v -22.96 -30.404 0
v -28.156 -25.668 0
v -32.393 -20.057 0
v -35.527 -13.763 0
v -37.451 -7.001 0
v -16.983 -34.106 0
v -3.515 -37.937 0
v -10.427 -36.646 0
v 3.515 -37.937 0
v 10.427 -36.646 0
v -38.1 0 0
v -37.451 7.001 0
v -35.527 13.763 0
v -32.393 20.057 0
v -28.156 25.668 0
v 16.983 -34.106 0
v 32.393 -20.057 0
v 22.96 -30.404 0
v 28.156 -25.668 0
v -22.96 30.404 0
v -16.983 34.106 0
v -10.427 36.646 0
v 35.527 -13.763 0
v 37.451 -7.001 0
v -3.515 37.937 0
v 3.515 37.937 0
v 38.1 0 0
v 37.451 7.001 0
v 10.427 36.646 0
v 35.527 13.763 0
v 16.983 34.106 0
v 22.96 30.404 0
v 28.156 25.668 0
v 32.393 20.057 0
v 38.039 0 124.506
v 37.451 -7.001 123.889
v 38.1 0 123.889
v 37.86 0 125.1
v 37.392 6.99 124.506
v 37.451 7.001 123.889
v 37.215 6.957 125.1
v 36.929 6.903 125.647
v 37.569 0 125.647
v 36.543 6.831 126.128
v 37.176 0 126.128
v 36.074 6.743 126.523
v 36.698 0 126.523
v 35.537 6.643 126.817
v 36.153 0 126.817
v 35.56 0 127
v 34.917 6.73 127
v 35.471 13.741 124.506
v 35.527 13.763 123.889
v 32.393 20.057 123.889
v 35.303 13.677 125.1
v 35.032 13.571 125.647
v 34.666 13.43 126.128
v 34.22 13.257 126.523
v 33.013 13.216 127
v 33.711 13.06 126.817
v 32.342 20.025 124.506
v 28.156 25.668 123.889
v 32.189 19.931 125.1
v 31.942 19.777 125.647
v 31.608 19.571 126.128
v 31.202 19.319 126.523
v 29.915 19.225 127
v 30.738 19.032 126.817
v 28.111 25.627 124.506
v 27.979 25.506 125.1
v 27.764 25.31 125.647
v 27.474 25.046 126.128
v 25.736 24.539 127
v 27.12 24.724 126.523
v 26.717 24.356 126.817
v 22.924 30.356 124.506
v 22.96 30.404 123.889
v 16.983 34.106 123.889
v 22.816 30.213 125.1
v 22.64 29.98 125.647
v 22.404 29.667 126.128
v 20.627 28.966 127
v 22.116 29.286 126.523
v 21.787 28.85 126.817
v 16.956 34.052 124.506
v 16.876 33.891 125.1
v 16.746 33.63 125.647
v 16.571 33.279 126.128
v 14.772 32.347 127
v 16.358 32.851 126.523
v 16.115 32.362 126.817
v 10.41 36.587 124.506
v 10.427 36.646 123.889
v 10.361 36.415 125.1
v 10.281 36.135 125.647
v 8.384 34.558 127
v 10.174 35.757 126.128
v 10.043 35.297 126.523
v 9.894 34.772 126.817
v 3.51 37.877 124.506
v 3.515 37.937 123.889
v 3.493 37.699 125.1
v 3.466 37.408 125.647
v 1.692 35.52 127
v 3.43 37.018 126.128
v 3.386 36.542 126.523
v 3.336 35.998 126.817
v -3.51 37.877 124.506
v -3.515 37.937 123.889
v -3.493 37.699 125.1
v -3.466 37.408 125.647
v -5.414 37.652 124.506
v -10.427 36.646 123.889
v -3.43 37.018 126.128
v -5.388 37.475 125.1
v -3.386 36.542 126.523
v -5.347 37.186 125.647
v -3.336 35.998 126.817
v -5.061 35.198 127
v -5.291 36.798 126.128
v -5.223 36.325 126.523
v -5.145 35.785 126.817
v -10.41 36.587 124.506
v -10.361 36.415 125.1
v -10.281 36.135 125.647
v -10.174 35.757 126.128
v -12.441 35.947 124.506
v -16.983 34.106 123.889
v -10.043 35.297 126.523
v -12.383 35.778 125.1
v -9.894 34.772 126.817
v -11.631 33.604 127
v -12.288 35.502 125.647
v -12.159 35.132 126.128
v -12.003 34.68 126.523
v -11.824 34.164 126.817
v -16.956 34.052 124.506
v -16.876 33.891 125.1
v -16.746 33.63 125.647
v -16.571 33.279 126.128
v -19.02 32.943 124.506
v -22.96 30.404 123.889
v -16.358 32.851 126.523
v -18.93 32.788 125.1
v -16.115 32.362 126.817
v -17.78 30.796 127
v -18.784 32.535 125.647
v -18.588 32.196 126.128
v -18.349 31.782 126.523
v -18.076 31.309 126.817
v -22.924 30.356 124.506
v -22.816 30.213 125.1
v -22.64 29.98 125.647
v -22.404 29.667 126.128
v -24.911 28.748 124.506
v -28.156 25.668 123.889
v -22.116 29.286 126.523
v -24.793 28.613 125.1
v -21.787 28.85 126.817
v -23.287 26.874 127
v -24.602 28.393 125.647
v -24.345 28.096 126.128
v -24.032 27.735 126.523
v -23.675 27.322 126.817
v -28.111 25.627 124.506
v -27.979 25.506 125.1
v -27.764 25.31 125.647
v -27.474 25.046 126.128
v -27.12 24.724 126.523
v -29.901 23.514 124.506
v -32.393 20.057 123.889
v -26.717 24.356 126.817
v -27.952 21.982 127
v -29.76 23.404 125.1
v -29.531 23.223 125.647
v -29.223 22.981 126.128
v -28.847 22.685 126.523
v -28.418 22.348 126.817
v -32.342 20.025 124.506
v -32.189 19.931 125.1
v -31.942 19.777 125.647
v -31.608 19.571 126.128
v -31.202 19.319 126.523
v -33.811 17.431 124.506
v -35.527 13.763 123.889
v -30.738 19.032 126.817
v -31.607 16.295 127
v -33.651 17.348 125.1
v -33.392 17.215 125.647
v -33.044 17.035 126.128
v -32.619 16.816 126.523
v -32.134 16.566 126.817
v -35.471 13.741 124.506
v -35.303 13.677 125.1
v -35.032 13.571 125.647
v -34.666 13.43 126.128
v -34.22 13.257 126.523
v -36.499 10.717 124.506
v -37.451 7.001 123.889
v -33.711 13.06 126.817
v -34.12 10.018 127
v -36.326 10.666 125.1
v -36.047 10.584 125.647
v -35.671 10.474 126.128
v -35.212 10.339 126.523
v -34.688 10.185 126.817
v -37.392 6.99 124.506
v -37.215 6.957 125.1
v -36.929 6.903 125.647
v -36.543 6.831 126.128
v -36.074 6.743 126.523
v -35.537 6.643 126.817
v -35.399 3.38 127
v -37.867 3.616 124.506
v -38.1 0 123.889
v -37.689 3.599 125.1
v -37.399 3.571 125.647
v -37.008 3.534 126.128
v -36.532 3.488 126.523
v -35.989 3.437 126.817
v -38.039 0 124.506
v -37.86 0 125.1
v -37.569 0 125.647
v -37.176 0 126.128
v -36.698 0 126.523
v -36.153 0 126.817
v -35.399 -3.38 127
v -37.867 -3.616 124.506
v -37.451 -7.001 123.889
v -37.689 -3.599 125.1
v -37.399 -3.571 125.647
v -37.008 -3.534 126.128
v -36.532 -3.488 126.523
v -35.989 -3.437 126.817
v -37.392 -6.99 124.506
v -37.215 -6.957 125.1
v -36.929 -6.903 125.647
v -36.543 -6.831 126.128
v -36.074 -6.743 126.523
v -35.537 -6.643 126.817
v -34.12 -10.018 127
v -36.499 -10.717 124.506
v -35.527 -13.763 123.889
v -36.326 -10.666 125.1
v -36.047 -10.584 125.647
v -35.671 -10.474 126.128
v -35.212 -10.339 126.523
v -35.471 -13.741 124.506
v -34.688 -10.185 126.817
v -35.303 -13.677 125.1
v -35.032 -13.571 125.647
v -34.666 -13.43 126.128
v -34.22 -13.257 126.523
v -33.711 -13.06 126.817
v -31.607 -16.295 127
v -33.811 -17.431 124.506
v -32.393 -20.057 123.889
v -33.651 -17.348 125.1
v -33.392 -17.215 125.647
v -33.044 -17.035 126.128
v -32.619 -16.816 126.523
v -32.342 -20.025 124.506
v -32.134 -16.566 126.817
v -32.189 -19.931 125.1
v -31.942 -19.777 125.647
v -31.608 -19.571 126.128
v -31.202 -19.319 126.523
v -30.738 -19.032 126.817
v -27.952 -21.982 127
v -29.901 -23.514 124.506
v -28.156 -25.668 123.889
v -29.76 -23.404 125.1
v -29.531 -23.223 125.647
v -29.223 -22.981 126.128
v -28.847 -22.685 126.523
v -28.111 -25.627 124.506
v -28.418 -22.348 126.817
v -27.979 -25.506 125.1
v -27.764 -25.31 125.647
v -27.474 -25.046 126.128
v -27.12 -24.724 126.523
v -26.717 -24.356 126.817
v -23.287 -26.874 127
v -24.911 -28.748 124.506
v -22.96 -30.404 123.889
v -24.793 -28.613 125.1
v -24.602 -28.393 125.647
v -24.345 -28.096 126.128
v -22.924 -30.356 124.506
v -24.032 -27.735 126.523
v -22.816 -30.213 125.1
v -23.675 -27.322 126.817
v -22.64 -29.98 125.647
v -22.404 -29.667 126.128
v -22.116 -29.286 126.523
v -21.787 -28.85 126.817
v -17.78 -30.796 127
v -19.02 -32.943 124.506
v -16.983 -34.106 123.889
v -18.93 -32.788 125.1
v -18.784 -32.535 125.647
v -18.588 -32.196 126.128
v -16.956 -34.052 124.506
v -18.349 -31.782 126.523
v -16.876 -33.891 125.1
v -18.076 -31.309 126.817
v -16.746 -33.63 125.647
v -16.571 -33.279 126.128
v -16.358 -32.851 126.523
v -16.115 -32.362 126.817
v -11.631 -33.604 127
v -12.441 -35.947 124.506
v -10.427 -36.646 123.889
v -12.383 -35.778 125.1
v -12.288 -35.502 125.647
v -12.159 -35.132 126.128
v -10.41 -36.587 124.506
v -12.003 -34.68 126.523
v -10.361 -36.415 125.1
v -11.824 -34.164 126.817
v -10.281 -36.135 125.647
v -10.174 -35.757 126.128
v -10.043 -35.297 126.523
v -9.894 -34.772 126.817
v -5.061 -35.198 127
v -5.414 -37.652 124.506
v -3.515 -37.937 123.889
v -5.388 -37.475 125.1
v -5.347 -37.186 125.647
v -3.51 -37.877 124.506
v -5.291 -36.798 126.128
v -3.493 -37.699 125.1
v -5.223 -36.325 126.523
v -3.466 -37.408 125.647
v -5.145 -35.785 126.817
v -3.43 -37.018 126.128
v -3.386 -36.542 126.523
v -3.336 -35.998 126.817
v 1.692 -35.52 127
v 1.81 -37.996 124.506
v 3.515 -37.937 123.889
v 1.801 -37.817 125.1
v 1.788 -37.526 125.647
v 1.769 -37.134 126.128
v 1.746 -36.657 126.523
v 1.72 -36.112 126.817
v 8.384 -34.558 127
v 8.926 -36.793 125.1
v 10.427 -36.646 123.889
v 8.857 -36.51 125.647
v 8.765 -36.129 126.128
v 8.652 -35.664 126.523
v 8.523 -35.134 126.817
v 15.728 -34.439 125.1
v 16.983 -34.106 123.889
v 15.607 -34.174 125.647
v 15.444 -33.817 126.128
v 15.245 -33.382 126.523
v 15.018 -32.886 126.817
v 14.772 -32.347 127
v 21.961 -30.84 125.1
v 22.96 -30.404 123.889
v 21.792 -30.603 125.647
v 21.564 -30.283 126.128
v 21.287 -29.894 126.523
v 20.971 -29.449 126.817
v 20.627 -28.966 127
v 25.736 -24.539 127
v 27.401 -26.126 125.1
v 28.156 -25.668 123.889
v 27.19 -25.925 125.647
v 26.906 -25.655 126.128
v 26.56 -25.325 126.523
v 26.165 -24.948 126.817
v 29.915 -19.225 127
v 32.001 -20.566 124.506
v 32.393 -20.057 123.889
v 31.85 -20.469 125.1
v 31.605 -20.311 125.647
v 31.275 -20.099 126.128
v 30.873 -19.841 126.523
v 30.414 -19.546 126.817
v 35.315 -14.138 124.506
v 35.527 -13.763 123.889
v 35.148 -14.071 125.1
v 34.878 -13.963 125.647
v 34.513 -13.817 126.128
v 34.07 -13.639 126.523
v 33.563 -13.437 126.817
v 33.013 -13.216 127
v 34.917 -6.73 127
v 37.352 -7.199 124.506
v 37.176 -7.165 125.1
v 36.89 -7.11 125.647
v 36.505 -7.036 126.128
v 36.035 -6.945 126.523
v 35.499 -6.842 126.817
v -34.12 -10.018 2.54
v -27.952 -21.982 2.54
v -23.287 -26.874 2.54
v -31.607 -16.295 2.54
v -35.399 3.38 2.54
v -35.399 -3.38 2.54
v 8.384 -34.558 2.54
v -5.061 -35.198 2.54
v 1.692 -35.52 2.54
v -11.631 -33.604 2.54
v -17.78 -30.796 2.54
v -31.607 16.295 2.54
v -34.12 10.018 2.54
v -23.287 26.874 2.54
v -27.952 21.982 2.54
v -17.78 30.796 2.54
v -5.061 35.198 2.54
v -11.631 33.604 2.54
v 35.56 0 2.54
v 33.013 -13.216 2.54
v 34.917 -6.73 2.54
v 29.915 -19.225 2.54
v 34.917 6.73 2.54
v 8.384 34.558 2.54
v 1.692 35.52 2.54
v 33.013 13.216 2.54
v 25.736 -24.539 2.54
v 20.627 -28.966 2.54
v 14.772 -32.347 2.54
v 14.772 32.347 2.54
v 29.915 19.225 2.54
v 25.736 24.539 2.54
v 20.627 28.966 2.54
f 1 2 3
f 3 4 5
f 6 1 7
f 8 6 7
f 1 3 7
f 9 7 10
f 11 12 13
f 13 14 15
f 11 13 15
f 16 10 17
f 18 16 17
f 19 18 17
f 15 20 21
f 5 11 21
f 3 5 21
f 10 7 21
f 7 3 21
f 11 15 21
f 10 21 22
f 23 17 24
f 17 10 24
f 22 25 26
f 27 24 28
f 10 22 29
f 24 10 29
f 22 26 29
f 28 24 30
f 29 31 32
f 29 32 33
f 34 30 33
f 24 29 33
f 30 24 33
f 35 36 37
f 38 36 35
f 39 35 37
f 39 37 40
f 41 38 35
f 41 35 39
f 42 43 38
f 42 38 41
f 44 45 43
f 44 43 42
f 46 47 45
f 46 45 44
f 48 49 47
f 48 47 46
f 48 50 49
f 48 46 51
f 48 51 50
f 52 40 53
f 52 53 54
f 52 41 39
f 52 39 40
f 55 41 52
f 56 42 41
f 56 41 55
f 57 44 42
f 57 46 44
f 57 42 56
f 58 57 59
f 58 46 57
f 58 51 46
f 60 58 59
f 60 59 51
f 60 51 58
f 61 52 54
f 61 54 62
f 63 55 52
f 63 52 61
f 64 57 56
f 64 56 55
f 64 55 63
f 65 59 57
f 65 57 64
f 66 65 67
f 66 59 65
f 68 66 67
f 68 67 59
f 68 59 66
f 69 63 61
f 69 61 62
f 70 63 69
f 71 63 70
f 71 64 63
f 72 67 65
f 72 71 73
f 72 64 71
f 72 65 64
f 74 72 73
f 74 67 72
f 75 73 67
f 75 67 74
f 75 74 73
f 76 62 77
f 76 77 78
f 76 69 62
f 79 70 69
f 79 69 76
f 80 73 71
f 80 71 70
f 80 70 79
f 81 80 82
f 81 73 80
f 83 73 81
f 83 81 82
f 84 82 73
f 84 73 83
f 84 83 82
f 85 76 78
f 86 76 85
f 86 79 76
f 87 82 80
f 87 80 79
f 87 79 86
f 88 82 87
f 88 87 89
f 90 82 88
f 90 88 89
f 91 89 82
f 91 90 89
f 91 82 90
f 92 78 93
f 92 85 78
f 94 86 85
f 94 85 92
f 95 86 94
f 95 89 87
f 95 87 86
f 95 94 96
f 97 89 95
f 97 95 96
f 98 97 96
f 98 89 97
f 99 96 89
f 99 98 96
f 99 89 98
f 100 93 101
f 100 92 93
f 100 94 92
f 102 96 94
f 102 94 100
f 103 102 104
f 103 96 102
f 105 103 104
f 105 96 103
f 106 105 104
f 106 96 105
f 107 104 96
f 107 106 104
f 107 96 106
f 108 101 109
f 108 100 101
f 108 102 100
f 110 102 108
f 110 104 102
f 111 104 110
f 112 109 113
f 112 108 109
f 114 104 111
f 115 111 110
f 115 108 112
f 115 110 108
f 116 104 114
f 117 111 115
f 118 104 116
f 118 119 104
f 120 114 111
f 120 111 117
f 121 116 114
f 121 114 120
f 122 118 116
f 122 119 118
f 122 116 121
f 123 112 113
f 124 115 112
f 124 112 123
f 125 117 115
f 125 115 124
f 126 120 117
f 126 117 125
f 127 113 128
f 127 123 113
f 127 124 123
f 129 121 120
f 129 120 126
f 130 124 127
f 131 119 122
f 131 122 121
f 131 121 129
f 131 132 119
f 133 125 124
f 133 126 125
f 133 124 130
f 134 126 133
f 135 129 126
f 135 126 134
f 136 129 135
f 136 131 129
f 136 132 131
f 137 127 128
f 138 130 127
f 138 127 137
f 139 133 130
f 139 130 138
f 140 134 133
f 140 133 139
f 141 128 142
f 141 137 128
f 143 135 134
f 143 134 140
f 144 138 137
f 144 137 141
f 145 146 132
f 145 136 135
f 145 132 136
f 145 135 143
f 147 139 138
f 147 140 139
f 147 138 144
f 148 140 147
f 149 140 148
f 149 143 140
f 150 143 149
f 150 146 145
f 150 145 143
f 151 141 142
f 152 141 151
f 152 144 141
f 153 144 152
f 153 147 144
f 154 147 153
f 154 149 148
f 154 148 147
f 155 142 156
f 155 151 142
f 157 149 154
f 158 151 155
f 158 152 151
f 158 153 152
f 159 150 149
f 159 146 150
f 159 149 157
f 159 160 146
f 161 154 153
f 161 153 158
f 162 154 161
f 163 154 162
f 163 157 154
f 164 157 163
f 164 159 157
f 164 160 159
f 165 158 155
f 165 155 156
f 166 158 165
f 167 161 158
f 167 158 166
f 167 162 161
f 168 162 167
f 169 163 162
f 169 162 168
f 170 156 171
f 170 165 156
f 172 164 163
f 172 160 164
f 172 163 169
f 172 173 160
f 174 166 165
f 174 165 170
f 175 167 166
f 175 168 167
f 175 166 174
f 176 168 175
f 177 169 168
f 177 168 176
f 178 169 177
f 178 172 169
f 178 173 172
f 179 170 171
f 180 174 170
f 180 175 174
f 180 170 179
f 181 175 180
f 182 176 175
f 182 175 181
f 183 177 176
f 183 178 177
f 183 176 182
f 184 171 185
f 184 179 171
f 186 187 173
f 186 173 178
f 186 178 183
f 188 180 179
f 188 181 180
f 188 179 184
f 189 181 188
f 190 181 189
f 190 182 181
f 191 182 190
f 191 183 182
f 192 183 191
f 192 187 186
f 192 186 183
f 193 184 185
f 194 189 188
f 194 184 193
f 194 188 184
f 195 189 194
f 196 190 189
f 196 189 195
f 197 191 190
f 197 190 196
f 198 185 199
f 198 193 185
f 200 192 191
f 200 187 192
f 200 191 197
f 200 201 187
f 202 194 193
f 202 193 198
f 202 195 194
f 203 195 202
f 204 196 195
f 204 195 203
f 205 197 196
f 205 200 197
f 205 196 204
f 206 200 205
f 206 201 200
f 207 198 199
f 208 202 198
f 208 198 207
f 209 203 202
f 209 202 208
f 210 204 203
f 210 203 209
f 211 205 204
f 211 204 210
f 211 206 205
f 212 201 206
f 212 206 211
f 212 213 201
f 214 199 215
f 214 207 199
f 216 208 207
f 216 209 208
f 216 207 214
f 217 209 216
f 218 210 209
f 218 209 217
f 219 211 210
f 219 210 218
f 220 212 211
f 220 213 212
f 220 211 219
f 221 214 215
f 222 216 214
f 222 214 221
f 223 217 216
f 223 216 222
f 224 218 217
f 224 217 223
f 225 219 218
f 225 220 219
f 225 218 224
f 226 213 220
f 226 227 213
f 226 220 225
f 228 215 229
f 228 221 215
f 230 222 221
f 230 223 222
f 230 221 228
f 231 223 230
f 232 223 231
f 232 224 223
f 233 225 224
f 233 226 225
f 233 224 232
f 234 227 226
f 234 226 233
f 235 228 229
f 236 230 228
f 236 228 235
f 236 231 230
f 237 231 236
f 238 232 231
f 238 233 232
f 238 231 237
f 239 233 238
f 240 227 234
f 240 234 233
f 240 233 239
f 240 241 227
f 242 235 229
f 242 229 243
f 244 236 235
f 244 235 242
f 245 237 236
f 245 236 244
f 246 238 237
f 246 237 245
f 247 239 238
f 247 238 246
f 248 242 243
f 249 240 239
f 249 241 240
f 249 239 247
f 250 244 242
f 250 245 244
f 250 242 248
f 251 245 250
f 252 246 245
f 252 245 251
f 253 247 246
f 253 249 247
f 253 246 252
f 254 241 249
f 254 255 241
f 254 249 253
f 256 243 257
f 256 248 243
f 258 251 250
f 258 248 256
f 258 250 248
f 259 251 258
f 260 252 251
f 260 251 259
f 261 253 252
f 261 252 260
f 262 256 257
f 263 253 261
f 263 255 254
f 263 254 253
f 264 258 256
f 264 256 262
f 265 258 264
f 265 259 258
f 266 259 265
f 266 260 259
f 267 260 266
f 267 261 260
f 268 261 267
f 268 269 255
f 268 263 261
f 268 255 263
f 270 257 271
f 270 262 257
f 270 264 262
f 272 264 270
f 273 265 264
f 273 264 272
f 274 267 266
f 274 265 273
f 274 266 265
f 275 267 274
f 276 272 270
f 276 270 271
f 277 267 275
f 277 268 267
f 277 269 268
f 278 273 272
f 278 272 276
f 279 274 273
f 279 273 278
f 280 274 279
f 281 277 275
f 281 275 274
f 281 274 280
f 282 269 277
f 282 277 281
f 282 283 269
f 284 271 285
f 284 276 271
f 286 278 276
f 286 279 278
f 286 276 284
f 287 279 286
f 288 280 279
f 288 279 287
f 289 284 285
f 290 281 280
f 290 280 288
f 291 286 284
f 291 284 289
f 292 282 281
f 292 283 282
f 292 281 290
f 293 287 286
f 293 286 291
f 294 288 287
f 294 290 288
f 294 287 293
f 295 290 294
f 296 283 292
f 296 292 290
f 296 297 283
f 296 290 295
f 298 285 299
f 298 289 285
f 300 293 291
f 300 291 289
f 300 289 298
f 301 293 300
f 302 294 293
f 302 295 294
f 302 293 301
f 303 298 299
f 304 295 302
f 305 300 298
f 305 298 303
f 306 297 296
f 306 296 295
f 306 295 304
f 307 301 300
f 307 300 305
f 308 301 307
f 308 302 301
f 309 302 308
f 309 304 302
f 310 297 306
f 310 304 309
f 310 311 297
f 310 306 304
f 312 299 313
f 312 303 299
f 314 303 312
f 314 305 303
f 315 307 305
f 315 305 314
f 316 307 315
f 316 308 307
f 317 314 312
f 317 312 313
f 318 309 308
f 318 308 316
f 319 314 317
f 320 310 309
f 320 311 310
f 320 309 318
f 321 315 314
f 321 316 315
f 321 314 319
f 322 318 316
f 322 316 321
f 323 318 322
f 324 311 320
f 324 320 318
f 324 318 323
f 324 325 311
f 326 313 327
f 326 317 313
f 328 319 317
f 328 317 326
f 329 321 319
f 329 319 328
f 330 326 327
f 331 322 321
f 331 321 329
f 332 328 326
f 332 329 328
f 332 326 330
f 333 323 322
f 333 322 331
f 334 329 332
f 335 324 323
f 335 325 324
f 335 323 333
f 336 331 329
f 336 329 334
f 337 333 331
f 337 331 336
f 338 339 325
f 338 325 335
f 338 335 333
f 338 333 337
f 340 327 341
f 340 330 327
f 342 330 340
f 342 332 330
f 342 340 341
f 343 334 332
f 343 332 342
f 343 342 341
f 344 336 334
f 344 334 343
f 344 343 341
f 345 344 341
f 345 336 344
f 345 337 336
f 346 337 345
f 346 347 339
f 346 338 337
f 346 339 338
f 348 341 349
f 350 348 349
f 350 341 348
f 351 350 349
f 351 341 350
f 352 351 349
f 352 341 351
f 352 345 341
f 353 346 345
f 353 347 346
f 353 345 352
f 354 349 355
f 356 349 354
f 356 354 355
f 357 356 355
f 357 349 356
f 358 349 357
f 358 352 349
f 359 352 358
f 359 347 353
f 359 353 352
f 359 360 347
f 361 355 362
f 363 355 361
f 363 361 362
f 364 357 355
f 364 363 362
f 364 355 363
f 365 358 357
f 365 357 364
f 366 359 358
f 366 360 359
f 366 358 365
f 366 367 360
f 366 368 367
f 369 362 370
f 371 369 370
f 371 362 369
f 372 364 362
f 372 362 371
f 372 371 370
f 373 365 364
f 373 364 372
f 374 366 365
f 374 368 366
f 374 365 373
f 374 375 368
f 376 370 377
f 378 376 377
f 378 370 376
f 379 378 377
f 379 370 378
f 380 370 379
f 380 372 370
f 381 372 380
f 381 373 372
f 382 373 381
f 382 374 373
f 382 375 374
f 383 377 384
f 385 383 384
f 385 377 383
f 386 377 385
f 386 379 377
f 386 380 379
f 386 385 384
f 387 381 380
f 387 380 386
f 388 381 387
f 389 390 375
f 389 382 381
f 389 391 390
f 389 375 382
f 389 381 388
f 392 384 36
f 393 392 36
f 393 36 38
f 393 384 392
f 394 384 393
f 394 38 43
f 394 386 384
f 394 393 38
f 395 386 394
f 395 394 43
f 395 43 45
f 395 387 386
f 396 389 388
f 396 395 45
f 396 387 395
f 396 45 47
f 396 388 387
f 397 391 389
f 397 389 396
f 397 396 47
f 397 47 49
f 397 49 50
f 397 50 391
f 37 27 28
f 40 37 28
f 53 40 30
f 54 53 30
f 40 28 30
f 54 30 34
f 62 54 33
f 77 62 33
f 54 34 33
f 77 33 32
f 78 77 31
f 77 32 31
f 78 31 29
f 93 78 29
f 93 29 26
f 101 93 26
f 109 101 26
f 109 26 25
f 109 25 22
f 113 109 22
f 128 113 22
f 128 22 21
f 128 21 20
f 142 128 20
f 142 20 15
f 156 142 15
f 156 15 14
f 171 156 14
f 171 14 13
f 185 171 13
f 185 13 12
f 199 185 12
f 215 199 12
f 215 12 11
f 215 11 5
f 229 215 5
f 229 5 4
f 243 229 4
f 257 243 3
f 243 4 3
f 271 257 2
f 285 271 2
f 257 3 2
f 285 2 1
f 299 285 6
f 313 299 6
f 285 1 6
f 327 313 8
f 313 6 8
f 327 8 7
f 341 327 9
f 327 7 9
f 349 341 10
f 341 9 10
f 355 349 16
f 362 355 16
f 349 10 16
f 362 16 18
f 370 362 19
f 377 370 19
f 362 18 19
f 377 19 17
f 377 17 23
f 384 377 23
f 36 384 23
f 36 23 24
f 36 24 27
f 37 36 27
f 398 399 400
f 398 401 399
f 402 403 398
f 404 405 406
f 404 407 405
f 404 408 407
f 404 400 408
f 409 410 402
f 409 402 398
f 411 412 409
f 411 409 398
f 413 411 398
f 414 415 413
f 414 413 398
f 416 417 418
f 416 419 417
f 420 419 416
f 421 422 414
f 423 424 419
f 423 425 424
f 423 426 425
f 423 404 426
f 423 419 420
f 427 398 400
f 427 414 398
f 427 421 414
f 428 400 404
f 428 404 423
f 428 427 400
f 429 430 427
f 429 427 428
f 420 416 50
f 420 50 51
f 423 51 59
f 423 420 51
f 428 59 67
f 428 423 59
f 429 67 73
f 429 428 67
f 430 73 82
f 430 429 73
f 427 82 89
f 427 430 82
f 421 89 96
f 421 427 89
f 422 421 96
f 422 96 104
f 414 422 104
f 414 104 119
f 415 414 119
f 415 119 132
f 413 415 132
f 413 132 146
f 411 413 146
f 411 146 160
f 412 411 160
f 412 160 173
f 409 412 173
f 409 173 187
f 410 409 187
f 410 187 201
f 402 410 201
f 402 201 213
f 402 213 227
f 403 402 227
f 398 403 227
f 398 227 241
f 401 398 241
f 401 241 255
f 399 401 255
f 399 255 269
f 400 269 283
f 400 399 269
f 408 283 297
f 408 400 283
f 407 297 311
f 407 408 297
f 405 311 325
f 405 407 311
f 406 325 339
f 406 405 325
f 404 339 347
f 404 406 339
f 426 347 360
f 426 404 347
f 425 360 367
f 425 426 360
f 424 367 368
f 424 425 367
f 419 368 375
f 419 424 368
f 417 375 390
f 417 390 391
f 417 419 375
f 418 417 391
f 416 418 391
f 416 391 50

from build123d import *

# Parameters (mm, degrees)
F0_R     = 38.1
F1_DEPTH = 127
F2_T     = -2.54


# Not quite as in the source:
# - a fillet or chamfer that OpenCascade refuses, or shapes differently, is made with other operations: its cross-section is extruded or revolved along the edge and cut away or added


with BuildPart() as f1:
    # F0 (on Top) → F1 (new body)
    with BuildSketch(Plane.XY):
        Circle(F0_R)
    extrude(amount=F1_DEPTH)

    # F2
    f2_openings = [f1.faces().sort_by_distance(p)[0] for p in [
        (0, 0, 127),
    ]]
    offset(amount=F2_T, openings=f2_openings)

    # F3: fillet of radius 3.175 on 1 edges, made by hand

    # F3_s1 → F3_t2 (revolve, cut)
    with BuildSketch(Plane.XZ):
        with BuildLine():
            ThreePointArc((38.1, 123.8891480267), (37.3843444248, 125.8971943409), (35.56, 127))
            Line((35.56, 127), (38.1, 127))
            Line((38.1, 127), (38.1, 123.8891480267))
        make_face()
    revolve(axis=Axis((0, 0, 127), (0, 0, 1)), mode=Mode.SUBTRACT)


solid = f1.part
